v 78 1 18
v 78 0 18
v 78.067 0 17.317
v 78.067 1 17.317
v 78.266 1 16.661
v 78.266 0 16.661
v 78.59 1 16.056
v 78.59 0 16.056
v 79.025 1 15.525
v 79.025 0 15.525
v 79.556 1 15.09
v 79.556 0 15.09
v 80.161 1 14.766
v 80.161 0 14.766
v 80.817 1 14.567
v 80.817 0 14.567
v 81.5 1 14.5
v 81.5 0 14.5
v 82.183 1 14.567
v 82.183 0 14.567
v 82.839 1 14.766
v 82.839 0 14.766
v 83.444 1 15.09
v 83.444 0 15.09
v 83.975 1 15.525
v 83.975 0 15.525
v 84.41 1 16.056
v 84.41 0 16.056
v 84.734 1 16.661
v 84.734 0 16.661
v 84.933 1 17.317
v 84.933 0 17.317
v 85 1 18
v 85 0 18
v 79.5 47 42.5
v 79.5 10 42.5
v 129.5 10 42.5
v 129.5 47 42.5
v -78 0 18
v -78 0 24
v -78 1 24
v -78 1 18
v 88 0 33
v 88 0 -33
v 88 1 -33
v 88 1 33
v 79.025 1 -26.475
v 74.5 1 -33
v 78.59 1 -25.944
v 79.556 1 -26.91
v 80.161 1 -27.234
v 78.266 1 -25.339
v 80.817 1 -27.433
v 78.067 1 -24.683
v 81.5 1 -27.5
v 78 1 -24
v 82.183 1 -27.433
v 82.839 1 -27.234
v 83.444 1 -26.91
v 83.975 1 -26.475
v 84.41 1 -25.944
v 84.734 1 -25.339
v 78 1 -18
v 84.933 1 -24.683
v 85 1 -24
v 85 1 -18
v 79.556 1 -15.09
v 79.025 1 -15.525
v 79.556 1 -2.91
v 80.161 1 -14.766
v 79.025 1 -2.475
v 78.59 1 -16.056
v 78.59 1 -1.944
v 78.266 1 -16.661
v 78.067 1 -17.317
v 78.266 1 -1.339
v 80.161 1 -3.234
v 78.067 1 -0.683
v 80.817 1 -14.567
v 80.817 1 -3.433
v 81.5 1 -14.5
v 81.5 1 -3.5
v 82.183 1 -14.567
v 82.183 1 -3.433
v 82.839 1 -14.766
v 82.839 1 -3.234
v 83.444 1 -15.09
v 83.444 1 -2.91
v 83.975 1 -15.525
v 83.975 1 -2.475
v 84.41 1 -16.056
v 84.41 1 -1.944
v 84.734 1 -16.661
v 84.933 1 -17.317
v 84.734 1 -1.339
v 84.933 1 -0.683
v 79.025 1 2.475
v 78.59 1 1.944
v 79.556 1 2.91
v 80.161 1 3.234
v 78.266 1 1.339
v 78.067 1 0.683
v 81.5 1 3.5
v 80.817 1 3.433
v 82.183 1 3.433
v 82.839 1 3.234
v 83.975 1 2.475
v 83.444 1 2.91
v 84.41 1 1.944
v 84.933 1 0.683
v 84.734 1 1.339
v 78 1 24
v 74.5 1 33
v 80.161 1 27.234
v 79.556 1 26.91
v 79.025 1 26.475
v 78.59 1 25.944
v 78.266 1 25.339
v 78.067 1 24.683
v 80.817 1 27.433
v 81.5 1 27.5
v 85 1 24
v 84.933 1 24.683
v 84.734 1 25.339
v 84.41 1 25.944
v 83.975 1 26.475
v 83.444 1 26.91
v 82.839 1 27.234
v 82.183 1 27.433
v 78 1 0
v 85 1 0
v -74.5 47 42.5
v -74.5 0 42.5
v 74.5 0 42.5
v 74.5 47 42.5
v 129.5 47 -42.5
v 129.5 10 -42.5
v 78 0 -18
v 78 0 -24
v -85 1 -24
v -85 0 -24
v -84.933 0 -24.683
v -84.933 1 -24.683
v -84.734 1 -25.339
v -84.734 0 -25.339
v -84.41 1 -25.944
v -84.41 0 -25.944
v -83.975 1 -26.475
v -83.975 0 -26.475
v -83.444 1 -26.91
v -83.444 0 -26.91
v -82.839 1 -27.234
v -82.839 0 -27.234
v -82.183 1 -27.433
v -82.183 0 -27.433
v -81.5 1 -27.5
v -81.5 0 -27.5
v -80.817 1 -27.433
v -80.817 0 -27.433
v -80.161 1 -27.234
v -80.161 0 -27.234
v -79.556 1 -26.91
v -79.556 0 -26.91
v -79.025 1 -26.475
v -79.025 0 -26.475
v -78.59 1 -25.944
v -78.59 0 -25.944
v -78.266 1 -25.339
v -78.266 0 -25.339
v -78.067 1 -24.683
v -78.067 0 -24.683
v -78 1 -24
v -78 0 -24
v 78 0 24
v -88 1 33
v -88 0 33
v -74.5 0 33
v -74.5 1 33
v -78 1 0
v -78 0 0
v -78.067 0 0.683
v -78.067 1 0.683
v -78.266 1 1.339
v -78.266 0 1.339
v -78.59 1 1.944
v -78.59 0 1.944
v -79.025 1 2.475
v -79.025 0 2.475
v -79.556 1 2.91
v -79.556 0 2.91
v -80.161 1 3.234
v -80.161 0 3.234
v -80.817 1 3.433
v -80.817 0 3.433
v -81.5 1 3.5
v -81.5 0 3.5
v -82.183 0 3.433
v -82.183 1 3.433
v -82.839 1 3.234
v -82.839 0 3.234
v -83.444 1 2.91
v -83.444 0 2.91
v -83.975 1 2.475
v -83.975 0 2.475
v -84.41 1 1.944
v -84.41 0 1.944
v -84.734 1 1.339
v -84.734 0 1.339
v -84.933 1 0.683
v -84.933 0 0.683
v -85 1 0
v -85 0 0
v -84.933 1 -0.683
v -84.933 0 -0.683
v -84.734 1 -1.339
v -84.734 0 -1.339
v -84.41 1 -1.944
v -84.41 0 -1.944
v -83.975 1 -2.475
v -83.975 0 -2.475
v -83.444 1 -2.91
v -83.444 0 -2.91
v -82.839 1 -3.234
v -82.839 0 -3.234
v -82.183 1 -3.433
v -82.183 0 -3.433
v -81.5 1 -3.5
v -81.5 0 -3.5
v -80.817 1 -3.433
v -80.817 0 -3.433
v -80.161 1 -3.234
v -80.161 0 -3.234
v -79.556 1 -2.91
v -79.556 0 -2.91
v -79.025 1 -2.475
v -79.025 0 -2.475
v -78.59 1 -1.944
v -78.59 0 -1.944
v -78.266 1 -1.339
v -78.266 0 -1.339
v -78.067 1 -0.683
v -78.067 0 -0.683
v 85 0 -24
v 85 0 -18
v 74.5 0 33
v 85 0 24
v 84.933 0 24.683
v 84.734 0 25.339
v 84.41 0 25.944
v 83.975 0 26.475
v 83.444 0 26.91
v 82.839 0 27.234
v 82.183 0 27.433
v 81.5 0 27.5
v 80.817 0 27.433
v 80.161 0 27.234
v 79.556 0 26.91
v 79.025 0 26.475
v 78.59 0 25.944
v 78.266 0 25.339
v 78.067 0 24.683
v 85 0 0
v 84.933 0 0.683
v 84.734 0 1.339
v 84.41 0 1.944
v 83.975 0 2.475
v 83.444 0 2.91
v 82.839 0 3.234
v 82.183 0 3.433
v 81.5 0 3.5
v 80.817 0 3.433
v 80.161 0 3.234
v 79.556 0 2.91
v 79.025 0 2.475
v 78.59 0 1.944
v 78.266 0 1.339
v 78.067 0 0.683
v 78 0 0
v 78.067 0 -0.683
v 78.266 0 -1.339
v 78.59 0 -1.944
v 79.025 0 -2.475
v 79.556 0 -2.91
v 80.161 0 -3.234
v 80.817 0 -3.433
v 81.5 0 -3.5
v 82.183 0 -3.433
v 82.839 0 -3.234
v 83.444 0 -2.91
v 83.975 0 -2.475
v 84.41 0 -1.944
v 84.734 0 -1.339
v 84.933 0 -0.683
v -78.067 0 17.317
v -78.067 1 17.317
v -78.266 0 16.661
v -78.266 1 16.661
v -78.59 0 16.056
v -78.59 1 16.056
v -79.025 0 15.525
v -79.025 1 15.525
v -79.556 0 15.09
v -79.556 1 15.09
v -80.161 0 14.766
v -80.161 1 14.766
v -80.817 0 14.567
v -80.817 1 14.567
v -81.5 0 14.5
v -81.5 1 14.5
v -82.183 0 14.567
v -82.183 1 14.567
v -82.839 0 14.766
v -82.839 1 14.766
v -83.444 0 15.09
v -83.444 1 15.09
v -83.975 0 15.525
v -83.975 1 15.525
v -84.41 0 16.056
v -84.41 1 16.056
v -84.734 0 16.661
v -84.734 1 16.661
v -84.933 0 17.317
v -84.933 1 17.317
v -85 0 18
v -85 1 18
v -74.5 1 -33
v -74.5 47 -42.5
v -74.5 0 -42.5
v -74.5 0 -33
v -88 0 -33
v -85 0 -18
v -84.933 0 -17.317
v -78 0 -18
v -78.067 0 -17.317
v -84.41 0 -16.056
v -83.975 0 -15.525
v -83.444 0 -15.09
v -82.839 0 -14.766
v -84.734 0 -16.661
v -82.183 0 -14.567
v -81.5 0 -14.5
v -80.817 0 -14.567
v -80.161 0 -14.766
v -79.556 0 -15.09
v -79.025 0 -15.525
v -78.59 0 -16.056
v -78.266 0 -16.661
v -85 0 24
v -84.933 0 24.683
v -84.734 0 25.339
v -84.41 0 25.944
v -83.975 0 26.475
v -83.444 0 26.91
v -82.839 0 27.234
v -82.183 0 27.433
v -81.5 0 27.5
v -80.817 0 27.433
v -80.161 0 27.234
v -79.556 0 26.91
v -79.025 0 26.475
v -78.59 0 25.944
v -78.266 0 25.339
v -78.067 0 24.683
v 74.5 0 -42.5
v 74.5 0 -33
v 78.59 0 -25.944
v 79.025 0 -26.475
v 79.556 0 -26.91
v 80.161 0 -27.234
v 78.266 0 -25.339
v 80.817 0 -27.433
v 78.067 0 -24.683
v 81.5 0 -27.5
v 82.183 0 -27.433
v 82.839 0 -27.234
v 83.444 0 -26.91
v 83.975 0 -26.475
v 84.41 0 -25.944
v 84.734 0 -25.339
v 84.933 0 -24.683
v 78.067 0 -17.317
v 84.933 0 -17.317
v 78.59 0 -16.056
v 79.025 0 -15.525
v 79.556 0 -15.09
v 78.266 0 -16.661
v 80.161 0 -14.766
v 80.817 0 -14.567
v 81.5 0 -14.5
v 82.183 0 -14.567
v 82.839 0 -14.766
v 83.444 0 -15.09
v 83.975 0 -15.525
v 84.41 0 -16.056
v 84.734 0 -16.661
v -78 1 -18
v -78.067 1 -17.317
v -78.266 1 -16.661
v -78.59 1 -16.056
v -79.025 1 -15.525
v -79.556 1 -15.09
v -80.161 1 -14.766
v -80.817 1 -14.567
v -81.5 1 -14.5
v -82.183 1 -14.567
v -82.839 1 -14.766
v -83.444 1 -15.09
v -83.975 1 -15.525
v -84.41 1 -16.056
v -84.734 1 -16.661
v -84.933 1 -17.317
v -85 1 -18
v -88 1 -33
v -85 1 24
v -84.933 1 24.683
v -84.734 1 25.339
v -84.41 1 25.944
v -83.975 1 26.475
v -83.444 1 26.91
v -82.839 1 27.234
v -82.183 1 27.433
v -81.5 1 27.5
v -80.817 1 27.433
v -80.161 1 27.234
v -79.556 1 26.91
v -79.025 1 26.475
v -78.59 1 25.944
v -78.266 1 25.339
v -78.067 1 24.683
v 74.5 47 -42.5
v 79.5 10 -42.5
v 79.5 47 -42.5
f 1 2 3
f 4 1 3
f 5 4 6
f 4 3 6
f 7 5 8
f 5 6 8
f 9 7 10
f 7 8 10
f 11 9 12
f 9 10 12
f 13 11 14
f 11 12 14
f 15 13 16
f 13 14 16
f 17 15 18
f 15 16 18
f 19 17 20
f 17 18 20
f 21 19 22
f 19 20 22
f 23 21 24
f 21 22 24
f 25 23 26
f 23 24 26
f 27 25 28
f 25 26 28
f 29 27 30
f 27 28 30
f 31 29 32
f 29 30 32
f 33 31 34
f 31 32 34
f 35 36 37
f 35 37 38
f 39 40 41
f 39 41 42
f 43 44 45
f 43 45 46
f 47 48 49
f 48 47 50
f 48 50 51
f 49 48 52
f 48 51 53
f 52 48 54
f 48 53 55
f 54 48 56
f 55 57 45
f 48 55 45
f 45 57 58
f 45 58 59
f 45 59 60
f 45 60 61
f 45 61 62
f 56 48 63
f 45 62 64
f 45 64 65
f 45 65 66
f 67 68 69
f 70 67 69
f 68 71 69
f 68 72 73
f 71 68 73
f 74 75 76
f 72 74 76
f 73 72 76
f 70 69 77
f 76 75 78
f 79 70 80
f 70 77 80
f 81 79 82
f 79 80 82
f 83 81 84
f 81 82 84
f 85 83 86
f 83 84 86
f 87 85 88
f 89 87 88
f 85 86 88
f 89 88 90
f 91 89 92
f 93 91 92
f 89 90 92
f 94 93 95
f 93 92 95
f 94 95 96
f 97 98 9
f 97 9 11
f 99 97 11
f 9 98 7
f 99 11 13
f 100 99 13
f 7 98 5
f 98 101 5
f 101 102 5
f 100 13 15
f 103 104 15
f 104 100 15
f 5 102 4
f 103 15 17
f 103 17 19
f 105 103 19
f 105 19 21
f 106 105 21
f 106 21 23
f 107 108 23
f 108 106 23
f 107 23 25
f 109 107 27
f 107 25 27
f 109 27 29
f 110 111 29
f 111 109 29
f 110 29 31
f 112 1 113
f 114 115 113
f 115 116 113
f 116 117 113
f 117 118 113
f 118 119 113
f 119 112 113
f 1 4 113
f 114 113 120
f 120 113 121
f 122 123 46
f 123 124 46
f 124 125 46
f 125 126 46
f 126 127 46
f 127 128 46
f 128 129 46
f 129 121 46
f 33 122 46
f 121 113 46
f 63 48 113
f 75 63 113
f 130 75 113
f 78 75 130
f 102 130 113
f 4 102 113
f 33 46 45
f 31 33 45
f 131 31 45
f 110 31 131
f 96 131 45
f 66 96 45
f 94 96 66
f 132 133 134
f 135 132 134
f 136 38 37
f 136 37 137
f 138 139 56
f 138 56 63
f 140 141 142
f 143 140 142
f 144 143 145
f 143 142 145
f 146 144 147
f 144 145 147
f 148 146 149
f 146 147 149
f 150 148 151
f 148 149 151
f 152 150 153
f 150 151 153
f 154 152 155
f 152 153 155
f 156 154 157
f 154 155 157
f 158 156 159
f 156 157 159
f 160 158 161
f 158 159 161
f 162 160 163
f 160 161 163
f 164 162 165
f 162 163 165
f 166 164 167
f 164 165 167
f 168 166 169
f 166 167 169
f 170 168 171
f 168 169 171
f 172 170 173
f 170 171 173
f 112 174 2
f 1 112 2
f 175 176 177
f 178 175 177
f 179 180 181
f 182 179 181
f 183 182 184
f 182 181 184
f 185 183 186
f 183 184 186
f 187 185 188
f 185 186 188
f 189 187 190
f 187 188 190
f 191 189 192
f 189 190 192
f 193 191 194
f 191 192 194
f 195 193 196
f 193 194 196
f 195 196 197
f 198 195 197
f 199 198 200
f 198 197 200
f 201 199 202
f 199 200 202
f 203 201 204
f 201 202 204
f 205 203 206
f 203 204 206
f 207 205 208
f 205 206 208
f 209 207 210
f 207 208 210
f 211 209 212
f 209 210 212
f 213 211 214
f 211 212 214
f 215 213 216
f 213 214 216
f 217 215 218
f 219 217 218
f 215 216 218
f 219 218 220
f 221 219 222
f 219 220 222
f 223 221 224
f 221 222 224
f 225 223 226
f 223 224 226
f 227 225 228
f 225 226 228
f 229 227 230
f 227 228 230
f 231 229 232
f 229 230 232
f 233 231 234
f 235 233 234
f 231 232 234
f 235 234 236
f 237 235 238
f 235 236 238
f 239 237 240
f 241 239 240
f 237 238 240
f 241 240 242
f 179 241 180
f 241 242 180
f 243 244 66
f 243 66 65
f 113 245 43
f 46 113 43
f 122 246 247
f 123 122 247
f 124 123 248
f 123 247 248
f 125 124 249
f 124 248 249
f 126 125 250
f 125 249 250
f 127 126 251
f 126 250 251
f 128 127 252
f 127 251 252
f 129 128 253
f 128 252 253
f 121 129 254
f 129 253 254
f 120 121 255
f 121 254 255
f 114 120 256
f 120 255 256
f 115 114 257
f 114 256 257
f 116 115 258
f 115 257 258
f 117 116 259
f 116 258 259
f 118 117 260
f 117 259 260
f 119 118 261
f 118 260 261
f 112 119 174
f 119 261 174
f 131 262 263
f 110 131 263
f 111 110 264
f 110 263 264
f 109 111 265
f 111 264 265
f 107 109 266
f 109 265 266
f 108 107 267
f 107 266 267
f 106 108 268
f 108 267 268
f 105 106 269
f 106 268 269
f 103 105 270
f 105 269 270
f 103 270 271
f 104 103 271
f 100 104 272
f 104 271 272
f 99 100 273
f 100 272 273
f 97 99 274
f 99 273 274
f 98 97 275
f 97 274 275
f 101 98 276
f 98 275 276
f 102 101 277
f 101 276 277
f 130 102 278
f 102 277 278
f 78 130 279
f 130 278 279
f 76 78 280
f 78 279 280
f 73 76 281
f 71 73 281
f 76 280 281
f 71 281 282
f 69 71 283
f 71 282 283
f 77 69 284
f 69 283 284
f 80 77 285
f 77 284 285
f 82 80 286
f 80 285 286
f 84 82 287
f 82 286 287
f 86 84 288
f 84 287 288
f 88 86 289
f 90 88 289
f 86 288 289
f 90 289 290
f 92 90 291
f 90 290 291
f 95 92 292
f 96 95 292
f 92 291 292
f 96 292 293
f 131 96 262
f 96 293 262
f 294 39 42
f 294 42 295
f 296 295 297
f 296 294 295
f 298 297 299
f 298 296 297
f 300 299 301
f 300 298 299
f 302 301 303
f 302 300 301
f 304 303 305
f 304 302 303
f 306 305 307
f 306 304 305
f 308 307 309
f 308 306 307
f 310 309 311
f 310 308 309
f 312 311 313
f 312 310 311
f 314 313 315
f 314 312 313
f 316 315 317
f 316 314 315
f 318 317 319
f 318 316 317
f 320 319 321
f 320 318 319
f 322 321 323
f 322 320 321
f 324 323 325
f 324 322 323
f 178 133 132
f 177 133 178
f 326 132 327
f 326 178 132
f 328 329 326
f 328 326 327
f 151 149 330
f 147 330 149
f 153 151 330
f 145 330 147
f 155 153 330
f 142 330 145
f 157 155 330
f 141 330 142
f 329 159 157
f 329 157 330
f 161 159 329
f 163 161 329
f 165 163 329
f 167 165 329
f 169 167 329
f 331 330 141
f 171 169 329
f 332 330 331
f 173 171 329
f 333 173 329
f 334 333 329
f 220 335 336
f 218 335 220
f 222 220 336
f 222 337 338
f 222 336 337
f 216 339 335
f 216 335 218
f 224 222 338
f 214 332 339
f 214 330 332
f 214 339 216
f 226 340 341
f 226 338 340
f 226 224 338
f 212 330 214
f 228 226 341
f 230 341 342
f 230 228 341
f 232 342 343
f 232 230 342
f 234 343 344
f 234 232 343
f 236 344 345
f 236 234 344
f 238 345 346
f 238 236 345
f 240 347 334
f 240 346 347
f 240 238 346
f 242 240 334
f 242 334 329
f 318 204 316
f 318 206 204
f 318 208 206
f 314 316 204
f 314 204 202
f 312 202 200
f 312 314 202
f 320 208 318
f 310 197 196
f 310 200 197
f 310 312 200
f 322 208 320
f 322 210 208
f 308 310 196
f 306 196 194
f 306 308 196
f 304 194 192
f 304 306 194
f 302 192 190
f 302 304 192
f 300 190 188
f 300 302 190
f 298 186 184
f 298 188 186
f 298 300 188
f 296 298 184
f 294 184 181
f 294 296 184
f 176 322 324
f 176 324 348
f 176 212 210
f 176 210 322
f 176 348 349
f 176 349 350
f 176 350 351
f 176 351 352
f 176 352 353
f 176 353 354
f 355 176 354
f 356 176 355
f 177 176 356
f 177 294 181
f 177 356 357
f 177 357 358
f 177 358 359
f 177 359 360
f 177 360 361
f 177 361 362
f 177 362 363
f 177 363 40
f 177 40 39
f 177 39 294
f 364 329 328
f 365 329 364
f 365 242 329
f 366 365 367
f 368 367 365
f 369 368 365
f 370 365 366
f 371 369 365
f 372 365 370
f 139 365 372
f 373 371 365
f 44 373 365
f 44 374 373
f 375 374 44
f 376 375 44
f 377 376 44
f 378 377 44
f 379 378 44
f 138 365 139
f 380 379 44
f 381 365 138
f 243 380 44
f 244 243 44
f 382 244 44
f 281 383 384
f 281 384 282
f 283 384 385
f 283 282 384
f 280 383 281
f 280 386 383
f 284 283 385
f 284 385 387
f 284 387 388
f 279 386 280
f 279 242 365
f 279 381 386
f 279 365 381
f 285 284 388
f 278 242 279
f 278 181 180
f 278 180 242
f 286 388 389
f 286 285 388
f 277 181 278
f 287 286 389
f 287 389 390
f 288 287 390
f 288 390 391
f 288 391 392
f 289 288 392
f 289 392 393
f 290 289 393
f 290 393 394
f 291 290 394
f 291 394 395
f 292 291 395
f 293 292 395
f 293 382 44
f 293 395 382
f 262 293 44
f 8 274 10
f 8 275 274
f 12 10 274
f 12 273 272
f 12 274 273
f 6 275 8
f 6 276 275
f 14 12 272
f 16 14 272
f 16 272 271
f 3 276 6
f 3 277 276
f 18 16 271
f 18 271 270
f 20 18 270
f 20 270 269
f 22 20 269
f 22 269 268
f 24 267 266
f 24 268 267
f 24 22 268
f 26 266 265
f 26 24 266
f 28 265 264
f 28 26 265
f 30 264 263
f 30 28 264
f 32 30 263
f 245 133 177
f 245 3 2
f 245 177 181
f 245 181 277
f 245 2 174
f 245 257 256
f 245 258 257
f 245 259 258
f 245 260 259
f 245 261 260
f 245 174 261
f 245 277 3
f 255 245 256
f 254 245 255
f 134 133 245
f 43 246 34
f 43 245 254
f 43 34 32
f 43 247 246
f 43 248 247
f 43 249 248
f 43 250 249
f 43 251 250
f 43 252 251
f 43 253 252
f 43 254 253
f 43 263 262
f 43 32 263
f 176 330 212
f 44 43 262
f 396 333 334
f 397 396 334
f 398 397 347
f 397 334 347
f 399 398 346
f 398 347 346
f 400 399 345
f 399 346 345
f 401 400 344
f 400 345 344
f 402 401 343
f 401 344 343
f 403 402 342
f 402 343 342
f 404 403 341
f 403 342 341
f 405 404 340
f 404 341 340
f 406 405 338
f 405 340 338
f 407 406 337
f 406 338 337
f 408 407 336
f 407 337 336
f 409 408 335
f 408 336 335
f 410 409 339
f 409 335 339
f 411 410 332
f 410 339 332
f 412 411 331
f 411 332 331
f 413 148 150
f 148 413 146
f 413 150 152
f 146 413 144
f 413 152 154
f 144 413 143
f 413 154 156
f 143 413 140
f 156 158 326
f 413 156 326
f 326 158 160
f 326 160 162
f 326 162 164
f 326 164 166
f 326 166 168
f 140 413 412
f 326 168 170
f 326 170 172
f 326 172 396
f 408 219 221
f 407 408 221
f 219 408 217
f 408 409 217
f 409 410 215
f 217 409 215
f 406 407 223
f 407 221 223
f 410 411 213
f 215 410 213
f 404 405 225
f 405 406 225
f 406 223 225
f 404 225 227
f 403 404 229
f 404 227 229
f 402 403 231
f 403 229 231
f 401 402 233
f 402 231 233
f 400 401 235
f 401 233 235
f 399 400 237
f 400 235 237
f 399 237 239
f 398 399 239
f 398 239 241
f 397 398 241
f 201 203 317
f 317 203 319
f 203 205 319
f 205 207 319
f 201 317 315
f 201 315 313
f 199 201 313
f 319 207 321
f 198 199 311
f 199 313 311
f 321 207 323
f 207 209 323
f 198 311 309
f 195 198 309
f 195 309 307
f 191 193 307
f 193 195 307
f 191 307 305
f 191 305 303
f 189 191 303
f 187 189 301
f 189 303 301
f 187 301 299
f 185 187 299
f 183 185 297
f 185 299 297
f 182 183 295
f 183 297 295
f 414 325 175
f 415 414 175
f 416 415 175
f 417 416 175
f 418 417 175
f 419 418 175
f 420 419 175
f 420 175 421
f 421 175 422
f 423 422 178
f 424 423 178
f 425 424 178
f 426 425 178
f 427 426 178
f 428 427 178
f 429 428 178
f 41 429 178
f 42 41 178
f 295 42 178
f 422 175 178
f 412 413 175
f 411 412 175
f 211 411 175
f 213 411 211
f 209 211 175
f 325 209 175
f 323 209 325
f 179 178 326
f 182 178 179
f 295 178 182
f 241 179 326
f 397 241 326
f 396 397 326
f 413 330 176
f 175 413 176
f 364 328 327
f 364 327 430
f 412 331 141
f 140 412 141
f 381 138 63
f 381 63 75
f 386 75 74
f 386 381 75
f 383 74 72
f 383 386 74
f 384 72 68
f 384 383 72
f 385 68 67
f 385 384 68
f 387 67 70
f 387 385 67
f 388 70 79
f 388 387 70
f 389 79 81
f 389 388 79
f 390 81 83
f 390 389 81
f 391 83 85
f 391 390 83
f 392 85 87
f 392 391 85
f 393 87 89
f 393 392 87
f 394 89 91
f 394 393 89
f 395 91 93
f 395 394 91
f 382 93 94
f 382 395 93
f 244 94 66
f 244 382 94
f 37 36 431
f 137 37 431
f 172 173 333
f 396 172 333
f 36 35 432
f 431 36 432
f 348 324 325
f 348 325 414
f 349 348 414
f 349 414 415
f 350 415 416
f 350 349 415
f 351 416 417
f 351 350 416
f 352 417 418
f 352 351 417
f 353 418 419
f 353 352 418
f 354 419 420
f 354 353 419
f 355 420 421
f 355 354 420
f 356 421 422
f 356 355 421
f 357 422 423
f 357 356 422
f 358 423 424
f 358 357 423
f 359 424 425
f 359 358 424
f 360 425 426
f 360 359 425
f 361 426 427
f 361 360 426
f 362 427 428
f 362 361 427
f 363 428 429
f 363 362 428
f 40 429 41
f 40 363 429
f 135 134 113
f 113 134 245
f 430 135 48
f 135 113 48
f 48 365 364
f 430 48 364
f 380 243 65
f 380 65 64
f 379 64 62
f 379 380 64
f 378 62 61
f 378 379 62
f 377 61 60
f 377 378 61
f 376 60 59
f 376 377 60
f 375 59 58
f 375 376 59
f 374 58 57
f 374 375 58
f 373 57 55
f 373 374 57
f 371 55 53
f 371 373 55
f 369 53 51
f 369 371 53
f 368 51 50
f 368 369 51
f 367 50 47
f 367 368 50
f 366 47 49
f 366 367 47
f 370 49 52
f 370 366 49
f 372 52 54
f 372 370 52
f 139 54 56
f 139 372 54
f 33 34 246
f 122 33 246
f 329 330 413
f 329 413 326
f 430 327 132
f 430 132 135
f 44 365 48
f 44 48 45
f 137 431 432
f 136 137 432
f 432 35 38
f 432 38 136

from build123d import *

# Parameters (mm, degrees)
SKETCH_1_W      = 149
SKETCH_1_H      = 85
EXTRUDE_1_DEPTH = 47
SKETCH_2_W      = 176
SKETCH_2_H      = 66
SKETCH_2_R      = 3.5
EXTRUDE_2_DEPTH = 1
EXTRUDE_START   = 5
SKETCH_3_W      = 85
SKETCH_3_H      = 37
EXTRUDE_3_DEPTH = 50


with BuildPart() as part:
    # Эскиз1 → Бобышка-Вытянуть1 (new body)
    with BuildSketch(Plane(origin=(0, 0, 0), x_dir=(1, 0, 0), z_dir=(0, 1, 0))):
        Rectangle(SKETCH_1_W, SKETCH_1_H)
    extrude(amount=EXTRUDE_1_DEPTH)

    # Эскиз2 → Бобышка-Вытянуть2 (add)
    with BuildSketch(Plane.XZ):
        Rectangle(SKETCH_2_W, SKETCH_2_H)
        with Locations((-81.5, 0)):
            Circle(SKETCH_2_R, mode=Mode.SUBTRACT)
        with Locations((81.5, 0)):
            Circle(SKETCH_2_R, mode=Mode.SUBTRACT)
        with BuildLine():
            Line((-78, 24), (-78, 18))
            ThreePointArc((-78, 18), (-81.5, 14.5), (-85, 18))
            Line((-85, 18), (-85, 24))
            ThreePointArc((-85, 24), (-81.5, 27.5), (-78, 24))
        make_face(mode=Mode.SUBTRACT)
        with BuildLine():
            Line((-78, -24), (-78, -18))
            ThreePointArc((-78, -18), (-81.5, -14.5), (-85, -18))
            Line((-85, -18), (-85, -24))
            ThreePointArc((-85, -24), (-81.5, -27.5), (-78, -24))
        make_face(mode=Mode.SUBTRACT)
        with BuildLine():
            Line((78, 24), (78, 18))
            ThreePointArc((78, 18), (81.5, 14.5), (85, 18))
            Line((85, 18), (85, 24))
            ThreePointArc((85, 24), (81.5, 27.5), (78, 24))
        make_face(mode=Mode.SUBTRACT)
        with BuildLine():
            Line((78, -24), (78, -18))
            ThreePointArc((78, -18), (81.5, -14.5), (85, -18))
            Line((85, -18), (85, -24))
            ThreePointArc((85, -24), (81.5, -27.5), (78, -24))
        make_face(mode=Mode.SUBTRACT)
    extrude(amount=-EXTRUDE_2_DEPTH)


with BuildPart() as body_2:
    # Эскиз3 → Бобышка-Вытянуть3 (new body)
    with BuildSketch(Plane(origin=(74.5, 0, 0), x_dir=(0, 0, -1), z_dir=(1, 0, 0)).offset(EXTRUDE_START)):
        with Locations((0, 28.5)):
            Rectangle(SKETCH_3_W, SKETCH_3_H)
    extrude(amount=EXTRUDE_3_DEPTH)


solid = Compound([part.part, body_2.part])
